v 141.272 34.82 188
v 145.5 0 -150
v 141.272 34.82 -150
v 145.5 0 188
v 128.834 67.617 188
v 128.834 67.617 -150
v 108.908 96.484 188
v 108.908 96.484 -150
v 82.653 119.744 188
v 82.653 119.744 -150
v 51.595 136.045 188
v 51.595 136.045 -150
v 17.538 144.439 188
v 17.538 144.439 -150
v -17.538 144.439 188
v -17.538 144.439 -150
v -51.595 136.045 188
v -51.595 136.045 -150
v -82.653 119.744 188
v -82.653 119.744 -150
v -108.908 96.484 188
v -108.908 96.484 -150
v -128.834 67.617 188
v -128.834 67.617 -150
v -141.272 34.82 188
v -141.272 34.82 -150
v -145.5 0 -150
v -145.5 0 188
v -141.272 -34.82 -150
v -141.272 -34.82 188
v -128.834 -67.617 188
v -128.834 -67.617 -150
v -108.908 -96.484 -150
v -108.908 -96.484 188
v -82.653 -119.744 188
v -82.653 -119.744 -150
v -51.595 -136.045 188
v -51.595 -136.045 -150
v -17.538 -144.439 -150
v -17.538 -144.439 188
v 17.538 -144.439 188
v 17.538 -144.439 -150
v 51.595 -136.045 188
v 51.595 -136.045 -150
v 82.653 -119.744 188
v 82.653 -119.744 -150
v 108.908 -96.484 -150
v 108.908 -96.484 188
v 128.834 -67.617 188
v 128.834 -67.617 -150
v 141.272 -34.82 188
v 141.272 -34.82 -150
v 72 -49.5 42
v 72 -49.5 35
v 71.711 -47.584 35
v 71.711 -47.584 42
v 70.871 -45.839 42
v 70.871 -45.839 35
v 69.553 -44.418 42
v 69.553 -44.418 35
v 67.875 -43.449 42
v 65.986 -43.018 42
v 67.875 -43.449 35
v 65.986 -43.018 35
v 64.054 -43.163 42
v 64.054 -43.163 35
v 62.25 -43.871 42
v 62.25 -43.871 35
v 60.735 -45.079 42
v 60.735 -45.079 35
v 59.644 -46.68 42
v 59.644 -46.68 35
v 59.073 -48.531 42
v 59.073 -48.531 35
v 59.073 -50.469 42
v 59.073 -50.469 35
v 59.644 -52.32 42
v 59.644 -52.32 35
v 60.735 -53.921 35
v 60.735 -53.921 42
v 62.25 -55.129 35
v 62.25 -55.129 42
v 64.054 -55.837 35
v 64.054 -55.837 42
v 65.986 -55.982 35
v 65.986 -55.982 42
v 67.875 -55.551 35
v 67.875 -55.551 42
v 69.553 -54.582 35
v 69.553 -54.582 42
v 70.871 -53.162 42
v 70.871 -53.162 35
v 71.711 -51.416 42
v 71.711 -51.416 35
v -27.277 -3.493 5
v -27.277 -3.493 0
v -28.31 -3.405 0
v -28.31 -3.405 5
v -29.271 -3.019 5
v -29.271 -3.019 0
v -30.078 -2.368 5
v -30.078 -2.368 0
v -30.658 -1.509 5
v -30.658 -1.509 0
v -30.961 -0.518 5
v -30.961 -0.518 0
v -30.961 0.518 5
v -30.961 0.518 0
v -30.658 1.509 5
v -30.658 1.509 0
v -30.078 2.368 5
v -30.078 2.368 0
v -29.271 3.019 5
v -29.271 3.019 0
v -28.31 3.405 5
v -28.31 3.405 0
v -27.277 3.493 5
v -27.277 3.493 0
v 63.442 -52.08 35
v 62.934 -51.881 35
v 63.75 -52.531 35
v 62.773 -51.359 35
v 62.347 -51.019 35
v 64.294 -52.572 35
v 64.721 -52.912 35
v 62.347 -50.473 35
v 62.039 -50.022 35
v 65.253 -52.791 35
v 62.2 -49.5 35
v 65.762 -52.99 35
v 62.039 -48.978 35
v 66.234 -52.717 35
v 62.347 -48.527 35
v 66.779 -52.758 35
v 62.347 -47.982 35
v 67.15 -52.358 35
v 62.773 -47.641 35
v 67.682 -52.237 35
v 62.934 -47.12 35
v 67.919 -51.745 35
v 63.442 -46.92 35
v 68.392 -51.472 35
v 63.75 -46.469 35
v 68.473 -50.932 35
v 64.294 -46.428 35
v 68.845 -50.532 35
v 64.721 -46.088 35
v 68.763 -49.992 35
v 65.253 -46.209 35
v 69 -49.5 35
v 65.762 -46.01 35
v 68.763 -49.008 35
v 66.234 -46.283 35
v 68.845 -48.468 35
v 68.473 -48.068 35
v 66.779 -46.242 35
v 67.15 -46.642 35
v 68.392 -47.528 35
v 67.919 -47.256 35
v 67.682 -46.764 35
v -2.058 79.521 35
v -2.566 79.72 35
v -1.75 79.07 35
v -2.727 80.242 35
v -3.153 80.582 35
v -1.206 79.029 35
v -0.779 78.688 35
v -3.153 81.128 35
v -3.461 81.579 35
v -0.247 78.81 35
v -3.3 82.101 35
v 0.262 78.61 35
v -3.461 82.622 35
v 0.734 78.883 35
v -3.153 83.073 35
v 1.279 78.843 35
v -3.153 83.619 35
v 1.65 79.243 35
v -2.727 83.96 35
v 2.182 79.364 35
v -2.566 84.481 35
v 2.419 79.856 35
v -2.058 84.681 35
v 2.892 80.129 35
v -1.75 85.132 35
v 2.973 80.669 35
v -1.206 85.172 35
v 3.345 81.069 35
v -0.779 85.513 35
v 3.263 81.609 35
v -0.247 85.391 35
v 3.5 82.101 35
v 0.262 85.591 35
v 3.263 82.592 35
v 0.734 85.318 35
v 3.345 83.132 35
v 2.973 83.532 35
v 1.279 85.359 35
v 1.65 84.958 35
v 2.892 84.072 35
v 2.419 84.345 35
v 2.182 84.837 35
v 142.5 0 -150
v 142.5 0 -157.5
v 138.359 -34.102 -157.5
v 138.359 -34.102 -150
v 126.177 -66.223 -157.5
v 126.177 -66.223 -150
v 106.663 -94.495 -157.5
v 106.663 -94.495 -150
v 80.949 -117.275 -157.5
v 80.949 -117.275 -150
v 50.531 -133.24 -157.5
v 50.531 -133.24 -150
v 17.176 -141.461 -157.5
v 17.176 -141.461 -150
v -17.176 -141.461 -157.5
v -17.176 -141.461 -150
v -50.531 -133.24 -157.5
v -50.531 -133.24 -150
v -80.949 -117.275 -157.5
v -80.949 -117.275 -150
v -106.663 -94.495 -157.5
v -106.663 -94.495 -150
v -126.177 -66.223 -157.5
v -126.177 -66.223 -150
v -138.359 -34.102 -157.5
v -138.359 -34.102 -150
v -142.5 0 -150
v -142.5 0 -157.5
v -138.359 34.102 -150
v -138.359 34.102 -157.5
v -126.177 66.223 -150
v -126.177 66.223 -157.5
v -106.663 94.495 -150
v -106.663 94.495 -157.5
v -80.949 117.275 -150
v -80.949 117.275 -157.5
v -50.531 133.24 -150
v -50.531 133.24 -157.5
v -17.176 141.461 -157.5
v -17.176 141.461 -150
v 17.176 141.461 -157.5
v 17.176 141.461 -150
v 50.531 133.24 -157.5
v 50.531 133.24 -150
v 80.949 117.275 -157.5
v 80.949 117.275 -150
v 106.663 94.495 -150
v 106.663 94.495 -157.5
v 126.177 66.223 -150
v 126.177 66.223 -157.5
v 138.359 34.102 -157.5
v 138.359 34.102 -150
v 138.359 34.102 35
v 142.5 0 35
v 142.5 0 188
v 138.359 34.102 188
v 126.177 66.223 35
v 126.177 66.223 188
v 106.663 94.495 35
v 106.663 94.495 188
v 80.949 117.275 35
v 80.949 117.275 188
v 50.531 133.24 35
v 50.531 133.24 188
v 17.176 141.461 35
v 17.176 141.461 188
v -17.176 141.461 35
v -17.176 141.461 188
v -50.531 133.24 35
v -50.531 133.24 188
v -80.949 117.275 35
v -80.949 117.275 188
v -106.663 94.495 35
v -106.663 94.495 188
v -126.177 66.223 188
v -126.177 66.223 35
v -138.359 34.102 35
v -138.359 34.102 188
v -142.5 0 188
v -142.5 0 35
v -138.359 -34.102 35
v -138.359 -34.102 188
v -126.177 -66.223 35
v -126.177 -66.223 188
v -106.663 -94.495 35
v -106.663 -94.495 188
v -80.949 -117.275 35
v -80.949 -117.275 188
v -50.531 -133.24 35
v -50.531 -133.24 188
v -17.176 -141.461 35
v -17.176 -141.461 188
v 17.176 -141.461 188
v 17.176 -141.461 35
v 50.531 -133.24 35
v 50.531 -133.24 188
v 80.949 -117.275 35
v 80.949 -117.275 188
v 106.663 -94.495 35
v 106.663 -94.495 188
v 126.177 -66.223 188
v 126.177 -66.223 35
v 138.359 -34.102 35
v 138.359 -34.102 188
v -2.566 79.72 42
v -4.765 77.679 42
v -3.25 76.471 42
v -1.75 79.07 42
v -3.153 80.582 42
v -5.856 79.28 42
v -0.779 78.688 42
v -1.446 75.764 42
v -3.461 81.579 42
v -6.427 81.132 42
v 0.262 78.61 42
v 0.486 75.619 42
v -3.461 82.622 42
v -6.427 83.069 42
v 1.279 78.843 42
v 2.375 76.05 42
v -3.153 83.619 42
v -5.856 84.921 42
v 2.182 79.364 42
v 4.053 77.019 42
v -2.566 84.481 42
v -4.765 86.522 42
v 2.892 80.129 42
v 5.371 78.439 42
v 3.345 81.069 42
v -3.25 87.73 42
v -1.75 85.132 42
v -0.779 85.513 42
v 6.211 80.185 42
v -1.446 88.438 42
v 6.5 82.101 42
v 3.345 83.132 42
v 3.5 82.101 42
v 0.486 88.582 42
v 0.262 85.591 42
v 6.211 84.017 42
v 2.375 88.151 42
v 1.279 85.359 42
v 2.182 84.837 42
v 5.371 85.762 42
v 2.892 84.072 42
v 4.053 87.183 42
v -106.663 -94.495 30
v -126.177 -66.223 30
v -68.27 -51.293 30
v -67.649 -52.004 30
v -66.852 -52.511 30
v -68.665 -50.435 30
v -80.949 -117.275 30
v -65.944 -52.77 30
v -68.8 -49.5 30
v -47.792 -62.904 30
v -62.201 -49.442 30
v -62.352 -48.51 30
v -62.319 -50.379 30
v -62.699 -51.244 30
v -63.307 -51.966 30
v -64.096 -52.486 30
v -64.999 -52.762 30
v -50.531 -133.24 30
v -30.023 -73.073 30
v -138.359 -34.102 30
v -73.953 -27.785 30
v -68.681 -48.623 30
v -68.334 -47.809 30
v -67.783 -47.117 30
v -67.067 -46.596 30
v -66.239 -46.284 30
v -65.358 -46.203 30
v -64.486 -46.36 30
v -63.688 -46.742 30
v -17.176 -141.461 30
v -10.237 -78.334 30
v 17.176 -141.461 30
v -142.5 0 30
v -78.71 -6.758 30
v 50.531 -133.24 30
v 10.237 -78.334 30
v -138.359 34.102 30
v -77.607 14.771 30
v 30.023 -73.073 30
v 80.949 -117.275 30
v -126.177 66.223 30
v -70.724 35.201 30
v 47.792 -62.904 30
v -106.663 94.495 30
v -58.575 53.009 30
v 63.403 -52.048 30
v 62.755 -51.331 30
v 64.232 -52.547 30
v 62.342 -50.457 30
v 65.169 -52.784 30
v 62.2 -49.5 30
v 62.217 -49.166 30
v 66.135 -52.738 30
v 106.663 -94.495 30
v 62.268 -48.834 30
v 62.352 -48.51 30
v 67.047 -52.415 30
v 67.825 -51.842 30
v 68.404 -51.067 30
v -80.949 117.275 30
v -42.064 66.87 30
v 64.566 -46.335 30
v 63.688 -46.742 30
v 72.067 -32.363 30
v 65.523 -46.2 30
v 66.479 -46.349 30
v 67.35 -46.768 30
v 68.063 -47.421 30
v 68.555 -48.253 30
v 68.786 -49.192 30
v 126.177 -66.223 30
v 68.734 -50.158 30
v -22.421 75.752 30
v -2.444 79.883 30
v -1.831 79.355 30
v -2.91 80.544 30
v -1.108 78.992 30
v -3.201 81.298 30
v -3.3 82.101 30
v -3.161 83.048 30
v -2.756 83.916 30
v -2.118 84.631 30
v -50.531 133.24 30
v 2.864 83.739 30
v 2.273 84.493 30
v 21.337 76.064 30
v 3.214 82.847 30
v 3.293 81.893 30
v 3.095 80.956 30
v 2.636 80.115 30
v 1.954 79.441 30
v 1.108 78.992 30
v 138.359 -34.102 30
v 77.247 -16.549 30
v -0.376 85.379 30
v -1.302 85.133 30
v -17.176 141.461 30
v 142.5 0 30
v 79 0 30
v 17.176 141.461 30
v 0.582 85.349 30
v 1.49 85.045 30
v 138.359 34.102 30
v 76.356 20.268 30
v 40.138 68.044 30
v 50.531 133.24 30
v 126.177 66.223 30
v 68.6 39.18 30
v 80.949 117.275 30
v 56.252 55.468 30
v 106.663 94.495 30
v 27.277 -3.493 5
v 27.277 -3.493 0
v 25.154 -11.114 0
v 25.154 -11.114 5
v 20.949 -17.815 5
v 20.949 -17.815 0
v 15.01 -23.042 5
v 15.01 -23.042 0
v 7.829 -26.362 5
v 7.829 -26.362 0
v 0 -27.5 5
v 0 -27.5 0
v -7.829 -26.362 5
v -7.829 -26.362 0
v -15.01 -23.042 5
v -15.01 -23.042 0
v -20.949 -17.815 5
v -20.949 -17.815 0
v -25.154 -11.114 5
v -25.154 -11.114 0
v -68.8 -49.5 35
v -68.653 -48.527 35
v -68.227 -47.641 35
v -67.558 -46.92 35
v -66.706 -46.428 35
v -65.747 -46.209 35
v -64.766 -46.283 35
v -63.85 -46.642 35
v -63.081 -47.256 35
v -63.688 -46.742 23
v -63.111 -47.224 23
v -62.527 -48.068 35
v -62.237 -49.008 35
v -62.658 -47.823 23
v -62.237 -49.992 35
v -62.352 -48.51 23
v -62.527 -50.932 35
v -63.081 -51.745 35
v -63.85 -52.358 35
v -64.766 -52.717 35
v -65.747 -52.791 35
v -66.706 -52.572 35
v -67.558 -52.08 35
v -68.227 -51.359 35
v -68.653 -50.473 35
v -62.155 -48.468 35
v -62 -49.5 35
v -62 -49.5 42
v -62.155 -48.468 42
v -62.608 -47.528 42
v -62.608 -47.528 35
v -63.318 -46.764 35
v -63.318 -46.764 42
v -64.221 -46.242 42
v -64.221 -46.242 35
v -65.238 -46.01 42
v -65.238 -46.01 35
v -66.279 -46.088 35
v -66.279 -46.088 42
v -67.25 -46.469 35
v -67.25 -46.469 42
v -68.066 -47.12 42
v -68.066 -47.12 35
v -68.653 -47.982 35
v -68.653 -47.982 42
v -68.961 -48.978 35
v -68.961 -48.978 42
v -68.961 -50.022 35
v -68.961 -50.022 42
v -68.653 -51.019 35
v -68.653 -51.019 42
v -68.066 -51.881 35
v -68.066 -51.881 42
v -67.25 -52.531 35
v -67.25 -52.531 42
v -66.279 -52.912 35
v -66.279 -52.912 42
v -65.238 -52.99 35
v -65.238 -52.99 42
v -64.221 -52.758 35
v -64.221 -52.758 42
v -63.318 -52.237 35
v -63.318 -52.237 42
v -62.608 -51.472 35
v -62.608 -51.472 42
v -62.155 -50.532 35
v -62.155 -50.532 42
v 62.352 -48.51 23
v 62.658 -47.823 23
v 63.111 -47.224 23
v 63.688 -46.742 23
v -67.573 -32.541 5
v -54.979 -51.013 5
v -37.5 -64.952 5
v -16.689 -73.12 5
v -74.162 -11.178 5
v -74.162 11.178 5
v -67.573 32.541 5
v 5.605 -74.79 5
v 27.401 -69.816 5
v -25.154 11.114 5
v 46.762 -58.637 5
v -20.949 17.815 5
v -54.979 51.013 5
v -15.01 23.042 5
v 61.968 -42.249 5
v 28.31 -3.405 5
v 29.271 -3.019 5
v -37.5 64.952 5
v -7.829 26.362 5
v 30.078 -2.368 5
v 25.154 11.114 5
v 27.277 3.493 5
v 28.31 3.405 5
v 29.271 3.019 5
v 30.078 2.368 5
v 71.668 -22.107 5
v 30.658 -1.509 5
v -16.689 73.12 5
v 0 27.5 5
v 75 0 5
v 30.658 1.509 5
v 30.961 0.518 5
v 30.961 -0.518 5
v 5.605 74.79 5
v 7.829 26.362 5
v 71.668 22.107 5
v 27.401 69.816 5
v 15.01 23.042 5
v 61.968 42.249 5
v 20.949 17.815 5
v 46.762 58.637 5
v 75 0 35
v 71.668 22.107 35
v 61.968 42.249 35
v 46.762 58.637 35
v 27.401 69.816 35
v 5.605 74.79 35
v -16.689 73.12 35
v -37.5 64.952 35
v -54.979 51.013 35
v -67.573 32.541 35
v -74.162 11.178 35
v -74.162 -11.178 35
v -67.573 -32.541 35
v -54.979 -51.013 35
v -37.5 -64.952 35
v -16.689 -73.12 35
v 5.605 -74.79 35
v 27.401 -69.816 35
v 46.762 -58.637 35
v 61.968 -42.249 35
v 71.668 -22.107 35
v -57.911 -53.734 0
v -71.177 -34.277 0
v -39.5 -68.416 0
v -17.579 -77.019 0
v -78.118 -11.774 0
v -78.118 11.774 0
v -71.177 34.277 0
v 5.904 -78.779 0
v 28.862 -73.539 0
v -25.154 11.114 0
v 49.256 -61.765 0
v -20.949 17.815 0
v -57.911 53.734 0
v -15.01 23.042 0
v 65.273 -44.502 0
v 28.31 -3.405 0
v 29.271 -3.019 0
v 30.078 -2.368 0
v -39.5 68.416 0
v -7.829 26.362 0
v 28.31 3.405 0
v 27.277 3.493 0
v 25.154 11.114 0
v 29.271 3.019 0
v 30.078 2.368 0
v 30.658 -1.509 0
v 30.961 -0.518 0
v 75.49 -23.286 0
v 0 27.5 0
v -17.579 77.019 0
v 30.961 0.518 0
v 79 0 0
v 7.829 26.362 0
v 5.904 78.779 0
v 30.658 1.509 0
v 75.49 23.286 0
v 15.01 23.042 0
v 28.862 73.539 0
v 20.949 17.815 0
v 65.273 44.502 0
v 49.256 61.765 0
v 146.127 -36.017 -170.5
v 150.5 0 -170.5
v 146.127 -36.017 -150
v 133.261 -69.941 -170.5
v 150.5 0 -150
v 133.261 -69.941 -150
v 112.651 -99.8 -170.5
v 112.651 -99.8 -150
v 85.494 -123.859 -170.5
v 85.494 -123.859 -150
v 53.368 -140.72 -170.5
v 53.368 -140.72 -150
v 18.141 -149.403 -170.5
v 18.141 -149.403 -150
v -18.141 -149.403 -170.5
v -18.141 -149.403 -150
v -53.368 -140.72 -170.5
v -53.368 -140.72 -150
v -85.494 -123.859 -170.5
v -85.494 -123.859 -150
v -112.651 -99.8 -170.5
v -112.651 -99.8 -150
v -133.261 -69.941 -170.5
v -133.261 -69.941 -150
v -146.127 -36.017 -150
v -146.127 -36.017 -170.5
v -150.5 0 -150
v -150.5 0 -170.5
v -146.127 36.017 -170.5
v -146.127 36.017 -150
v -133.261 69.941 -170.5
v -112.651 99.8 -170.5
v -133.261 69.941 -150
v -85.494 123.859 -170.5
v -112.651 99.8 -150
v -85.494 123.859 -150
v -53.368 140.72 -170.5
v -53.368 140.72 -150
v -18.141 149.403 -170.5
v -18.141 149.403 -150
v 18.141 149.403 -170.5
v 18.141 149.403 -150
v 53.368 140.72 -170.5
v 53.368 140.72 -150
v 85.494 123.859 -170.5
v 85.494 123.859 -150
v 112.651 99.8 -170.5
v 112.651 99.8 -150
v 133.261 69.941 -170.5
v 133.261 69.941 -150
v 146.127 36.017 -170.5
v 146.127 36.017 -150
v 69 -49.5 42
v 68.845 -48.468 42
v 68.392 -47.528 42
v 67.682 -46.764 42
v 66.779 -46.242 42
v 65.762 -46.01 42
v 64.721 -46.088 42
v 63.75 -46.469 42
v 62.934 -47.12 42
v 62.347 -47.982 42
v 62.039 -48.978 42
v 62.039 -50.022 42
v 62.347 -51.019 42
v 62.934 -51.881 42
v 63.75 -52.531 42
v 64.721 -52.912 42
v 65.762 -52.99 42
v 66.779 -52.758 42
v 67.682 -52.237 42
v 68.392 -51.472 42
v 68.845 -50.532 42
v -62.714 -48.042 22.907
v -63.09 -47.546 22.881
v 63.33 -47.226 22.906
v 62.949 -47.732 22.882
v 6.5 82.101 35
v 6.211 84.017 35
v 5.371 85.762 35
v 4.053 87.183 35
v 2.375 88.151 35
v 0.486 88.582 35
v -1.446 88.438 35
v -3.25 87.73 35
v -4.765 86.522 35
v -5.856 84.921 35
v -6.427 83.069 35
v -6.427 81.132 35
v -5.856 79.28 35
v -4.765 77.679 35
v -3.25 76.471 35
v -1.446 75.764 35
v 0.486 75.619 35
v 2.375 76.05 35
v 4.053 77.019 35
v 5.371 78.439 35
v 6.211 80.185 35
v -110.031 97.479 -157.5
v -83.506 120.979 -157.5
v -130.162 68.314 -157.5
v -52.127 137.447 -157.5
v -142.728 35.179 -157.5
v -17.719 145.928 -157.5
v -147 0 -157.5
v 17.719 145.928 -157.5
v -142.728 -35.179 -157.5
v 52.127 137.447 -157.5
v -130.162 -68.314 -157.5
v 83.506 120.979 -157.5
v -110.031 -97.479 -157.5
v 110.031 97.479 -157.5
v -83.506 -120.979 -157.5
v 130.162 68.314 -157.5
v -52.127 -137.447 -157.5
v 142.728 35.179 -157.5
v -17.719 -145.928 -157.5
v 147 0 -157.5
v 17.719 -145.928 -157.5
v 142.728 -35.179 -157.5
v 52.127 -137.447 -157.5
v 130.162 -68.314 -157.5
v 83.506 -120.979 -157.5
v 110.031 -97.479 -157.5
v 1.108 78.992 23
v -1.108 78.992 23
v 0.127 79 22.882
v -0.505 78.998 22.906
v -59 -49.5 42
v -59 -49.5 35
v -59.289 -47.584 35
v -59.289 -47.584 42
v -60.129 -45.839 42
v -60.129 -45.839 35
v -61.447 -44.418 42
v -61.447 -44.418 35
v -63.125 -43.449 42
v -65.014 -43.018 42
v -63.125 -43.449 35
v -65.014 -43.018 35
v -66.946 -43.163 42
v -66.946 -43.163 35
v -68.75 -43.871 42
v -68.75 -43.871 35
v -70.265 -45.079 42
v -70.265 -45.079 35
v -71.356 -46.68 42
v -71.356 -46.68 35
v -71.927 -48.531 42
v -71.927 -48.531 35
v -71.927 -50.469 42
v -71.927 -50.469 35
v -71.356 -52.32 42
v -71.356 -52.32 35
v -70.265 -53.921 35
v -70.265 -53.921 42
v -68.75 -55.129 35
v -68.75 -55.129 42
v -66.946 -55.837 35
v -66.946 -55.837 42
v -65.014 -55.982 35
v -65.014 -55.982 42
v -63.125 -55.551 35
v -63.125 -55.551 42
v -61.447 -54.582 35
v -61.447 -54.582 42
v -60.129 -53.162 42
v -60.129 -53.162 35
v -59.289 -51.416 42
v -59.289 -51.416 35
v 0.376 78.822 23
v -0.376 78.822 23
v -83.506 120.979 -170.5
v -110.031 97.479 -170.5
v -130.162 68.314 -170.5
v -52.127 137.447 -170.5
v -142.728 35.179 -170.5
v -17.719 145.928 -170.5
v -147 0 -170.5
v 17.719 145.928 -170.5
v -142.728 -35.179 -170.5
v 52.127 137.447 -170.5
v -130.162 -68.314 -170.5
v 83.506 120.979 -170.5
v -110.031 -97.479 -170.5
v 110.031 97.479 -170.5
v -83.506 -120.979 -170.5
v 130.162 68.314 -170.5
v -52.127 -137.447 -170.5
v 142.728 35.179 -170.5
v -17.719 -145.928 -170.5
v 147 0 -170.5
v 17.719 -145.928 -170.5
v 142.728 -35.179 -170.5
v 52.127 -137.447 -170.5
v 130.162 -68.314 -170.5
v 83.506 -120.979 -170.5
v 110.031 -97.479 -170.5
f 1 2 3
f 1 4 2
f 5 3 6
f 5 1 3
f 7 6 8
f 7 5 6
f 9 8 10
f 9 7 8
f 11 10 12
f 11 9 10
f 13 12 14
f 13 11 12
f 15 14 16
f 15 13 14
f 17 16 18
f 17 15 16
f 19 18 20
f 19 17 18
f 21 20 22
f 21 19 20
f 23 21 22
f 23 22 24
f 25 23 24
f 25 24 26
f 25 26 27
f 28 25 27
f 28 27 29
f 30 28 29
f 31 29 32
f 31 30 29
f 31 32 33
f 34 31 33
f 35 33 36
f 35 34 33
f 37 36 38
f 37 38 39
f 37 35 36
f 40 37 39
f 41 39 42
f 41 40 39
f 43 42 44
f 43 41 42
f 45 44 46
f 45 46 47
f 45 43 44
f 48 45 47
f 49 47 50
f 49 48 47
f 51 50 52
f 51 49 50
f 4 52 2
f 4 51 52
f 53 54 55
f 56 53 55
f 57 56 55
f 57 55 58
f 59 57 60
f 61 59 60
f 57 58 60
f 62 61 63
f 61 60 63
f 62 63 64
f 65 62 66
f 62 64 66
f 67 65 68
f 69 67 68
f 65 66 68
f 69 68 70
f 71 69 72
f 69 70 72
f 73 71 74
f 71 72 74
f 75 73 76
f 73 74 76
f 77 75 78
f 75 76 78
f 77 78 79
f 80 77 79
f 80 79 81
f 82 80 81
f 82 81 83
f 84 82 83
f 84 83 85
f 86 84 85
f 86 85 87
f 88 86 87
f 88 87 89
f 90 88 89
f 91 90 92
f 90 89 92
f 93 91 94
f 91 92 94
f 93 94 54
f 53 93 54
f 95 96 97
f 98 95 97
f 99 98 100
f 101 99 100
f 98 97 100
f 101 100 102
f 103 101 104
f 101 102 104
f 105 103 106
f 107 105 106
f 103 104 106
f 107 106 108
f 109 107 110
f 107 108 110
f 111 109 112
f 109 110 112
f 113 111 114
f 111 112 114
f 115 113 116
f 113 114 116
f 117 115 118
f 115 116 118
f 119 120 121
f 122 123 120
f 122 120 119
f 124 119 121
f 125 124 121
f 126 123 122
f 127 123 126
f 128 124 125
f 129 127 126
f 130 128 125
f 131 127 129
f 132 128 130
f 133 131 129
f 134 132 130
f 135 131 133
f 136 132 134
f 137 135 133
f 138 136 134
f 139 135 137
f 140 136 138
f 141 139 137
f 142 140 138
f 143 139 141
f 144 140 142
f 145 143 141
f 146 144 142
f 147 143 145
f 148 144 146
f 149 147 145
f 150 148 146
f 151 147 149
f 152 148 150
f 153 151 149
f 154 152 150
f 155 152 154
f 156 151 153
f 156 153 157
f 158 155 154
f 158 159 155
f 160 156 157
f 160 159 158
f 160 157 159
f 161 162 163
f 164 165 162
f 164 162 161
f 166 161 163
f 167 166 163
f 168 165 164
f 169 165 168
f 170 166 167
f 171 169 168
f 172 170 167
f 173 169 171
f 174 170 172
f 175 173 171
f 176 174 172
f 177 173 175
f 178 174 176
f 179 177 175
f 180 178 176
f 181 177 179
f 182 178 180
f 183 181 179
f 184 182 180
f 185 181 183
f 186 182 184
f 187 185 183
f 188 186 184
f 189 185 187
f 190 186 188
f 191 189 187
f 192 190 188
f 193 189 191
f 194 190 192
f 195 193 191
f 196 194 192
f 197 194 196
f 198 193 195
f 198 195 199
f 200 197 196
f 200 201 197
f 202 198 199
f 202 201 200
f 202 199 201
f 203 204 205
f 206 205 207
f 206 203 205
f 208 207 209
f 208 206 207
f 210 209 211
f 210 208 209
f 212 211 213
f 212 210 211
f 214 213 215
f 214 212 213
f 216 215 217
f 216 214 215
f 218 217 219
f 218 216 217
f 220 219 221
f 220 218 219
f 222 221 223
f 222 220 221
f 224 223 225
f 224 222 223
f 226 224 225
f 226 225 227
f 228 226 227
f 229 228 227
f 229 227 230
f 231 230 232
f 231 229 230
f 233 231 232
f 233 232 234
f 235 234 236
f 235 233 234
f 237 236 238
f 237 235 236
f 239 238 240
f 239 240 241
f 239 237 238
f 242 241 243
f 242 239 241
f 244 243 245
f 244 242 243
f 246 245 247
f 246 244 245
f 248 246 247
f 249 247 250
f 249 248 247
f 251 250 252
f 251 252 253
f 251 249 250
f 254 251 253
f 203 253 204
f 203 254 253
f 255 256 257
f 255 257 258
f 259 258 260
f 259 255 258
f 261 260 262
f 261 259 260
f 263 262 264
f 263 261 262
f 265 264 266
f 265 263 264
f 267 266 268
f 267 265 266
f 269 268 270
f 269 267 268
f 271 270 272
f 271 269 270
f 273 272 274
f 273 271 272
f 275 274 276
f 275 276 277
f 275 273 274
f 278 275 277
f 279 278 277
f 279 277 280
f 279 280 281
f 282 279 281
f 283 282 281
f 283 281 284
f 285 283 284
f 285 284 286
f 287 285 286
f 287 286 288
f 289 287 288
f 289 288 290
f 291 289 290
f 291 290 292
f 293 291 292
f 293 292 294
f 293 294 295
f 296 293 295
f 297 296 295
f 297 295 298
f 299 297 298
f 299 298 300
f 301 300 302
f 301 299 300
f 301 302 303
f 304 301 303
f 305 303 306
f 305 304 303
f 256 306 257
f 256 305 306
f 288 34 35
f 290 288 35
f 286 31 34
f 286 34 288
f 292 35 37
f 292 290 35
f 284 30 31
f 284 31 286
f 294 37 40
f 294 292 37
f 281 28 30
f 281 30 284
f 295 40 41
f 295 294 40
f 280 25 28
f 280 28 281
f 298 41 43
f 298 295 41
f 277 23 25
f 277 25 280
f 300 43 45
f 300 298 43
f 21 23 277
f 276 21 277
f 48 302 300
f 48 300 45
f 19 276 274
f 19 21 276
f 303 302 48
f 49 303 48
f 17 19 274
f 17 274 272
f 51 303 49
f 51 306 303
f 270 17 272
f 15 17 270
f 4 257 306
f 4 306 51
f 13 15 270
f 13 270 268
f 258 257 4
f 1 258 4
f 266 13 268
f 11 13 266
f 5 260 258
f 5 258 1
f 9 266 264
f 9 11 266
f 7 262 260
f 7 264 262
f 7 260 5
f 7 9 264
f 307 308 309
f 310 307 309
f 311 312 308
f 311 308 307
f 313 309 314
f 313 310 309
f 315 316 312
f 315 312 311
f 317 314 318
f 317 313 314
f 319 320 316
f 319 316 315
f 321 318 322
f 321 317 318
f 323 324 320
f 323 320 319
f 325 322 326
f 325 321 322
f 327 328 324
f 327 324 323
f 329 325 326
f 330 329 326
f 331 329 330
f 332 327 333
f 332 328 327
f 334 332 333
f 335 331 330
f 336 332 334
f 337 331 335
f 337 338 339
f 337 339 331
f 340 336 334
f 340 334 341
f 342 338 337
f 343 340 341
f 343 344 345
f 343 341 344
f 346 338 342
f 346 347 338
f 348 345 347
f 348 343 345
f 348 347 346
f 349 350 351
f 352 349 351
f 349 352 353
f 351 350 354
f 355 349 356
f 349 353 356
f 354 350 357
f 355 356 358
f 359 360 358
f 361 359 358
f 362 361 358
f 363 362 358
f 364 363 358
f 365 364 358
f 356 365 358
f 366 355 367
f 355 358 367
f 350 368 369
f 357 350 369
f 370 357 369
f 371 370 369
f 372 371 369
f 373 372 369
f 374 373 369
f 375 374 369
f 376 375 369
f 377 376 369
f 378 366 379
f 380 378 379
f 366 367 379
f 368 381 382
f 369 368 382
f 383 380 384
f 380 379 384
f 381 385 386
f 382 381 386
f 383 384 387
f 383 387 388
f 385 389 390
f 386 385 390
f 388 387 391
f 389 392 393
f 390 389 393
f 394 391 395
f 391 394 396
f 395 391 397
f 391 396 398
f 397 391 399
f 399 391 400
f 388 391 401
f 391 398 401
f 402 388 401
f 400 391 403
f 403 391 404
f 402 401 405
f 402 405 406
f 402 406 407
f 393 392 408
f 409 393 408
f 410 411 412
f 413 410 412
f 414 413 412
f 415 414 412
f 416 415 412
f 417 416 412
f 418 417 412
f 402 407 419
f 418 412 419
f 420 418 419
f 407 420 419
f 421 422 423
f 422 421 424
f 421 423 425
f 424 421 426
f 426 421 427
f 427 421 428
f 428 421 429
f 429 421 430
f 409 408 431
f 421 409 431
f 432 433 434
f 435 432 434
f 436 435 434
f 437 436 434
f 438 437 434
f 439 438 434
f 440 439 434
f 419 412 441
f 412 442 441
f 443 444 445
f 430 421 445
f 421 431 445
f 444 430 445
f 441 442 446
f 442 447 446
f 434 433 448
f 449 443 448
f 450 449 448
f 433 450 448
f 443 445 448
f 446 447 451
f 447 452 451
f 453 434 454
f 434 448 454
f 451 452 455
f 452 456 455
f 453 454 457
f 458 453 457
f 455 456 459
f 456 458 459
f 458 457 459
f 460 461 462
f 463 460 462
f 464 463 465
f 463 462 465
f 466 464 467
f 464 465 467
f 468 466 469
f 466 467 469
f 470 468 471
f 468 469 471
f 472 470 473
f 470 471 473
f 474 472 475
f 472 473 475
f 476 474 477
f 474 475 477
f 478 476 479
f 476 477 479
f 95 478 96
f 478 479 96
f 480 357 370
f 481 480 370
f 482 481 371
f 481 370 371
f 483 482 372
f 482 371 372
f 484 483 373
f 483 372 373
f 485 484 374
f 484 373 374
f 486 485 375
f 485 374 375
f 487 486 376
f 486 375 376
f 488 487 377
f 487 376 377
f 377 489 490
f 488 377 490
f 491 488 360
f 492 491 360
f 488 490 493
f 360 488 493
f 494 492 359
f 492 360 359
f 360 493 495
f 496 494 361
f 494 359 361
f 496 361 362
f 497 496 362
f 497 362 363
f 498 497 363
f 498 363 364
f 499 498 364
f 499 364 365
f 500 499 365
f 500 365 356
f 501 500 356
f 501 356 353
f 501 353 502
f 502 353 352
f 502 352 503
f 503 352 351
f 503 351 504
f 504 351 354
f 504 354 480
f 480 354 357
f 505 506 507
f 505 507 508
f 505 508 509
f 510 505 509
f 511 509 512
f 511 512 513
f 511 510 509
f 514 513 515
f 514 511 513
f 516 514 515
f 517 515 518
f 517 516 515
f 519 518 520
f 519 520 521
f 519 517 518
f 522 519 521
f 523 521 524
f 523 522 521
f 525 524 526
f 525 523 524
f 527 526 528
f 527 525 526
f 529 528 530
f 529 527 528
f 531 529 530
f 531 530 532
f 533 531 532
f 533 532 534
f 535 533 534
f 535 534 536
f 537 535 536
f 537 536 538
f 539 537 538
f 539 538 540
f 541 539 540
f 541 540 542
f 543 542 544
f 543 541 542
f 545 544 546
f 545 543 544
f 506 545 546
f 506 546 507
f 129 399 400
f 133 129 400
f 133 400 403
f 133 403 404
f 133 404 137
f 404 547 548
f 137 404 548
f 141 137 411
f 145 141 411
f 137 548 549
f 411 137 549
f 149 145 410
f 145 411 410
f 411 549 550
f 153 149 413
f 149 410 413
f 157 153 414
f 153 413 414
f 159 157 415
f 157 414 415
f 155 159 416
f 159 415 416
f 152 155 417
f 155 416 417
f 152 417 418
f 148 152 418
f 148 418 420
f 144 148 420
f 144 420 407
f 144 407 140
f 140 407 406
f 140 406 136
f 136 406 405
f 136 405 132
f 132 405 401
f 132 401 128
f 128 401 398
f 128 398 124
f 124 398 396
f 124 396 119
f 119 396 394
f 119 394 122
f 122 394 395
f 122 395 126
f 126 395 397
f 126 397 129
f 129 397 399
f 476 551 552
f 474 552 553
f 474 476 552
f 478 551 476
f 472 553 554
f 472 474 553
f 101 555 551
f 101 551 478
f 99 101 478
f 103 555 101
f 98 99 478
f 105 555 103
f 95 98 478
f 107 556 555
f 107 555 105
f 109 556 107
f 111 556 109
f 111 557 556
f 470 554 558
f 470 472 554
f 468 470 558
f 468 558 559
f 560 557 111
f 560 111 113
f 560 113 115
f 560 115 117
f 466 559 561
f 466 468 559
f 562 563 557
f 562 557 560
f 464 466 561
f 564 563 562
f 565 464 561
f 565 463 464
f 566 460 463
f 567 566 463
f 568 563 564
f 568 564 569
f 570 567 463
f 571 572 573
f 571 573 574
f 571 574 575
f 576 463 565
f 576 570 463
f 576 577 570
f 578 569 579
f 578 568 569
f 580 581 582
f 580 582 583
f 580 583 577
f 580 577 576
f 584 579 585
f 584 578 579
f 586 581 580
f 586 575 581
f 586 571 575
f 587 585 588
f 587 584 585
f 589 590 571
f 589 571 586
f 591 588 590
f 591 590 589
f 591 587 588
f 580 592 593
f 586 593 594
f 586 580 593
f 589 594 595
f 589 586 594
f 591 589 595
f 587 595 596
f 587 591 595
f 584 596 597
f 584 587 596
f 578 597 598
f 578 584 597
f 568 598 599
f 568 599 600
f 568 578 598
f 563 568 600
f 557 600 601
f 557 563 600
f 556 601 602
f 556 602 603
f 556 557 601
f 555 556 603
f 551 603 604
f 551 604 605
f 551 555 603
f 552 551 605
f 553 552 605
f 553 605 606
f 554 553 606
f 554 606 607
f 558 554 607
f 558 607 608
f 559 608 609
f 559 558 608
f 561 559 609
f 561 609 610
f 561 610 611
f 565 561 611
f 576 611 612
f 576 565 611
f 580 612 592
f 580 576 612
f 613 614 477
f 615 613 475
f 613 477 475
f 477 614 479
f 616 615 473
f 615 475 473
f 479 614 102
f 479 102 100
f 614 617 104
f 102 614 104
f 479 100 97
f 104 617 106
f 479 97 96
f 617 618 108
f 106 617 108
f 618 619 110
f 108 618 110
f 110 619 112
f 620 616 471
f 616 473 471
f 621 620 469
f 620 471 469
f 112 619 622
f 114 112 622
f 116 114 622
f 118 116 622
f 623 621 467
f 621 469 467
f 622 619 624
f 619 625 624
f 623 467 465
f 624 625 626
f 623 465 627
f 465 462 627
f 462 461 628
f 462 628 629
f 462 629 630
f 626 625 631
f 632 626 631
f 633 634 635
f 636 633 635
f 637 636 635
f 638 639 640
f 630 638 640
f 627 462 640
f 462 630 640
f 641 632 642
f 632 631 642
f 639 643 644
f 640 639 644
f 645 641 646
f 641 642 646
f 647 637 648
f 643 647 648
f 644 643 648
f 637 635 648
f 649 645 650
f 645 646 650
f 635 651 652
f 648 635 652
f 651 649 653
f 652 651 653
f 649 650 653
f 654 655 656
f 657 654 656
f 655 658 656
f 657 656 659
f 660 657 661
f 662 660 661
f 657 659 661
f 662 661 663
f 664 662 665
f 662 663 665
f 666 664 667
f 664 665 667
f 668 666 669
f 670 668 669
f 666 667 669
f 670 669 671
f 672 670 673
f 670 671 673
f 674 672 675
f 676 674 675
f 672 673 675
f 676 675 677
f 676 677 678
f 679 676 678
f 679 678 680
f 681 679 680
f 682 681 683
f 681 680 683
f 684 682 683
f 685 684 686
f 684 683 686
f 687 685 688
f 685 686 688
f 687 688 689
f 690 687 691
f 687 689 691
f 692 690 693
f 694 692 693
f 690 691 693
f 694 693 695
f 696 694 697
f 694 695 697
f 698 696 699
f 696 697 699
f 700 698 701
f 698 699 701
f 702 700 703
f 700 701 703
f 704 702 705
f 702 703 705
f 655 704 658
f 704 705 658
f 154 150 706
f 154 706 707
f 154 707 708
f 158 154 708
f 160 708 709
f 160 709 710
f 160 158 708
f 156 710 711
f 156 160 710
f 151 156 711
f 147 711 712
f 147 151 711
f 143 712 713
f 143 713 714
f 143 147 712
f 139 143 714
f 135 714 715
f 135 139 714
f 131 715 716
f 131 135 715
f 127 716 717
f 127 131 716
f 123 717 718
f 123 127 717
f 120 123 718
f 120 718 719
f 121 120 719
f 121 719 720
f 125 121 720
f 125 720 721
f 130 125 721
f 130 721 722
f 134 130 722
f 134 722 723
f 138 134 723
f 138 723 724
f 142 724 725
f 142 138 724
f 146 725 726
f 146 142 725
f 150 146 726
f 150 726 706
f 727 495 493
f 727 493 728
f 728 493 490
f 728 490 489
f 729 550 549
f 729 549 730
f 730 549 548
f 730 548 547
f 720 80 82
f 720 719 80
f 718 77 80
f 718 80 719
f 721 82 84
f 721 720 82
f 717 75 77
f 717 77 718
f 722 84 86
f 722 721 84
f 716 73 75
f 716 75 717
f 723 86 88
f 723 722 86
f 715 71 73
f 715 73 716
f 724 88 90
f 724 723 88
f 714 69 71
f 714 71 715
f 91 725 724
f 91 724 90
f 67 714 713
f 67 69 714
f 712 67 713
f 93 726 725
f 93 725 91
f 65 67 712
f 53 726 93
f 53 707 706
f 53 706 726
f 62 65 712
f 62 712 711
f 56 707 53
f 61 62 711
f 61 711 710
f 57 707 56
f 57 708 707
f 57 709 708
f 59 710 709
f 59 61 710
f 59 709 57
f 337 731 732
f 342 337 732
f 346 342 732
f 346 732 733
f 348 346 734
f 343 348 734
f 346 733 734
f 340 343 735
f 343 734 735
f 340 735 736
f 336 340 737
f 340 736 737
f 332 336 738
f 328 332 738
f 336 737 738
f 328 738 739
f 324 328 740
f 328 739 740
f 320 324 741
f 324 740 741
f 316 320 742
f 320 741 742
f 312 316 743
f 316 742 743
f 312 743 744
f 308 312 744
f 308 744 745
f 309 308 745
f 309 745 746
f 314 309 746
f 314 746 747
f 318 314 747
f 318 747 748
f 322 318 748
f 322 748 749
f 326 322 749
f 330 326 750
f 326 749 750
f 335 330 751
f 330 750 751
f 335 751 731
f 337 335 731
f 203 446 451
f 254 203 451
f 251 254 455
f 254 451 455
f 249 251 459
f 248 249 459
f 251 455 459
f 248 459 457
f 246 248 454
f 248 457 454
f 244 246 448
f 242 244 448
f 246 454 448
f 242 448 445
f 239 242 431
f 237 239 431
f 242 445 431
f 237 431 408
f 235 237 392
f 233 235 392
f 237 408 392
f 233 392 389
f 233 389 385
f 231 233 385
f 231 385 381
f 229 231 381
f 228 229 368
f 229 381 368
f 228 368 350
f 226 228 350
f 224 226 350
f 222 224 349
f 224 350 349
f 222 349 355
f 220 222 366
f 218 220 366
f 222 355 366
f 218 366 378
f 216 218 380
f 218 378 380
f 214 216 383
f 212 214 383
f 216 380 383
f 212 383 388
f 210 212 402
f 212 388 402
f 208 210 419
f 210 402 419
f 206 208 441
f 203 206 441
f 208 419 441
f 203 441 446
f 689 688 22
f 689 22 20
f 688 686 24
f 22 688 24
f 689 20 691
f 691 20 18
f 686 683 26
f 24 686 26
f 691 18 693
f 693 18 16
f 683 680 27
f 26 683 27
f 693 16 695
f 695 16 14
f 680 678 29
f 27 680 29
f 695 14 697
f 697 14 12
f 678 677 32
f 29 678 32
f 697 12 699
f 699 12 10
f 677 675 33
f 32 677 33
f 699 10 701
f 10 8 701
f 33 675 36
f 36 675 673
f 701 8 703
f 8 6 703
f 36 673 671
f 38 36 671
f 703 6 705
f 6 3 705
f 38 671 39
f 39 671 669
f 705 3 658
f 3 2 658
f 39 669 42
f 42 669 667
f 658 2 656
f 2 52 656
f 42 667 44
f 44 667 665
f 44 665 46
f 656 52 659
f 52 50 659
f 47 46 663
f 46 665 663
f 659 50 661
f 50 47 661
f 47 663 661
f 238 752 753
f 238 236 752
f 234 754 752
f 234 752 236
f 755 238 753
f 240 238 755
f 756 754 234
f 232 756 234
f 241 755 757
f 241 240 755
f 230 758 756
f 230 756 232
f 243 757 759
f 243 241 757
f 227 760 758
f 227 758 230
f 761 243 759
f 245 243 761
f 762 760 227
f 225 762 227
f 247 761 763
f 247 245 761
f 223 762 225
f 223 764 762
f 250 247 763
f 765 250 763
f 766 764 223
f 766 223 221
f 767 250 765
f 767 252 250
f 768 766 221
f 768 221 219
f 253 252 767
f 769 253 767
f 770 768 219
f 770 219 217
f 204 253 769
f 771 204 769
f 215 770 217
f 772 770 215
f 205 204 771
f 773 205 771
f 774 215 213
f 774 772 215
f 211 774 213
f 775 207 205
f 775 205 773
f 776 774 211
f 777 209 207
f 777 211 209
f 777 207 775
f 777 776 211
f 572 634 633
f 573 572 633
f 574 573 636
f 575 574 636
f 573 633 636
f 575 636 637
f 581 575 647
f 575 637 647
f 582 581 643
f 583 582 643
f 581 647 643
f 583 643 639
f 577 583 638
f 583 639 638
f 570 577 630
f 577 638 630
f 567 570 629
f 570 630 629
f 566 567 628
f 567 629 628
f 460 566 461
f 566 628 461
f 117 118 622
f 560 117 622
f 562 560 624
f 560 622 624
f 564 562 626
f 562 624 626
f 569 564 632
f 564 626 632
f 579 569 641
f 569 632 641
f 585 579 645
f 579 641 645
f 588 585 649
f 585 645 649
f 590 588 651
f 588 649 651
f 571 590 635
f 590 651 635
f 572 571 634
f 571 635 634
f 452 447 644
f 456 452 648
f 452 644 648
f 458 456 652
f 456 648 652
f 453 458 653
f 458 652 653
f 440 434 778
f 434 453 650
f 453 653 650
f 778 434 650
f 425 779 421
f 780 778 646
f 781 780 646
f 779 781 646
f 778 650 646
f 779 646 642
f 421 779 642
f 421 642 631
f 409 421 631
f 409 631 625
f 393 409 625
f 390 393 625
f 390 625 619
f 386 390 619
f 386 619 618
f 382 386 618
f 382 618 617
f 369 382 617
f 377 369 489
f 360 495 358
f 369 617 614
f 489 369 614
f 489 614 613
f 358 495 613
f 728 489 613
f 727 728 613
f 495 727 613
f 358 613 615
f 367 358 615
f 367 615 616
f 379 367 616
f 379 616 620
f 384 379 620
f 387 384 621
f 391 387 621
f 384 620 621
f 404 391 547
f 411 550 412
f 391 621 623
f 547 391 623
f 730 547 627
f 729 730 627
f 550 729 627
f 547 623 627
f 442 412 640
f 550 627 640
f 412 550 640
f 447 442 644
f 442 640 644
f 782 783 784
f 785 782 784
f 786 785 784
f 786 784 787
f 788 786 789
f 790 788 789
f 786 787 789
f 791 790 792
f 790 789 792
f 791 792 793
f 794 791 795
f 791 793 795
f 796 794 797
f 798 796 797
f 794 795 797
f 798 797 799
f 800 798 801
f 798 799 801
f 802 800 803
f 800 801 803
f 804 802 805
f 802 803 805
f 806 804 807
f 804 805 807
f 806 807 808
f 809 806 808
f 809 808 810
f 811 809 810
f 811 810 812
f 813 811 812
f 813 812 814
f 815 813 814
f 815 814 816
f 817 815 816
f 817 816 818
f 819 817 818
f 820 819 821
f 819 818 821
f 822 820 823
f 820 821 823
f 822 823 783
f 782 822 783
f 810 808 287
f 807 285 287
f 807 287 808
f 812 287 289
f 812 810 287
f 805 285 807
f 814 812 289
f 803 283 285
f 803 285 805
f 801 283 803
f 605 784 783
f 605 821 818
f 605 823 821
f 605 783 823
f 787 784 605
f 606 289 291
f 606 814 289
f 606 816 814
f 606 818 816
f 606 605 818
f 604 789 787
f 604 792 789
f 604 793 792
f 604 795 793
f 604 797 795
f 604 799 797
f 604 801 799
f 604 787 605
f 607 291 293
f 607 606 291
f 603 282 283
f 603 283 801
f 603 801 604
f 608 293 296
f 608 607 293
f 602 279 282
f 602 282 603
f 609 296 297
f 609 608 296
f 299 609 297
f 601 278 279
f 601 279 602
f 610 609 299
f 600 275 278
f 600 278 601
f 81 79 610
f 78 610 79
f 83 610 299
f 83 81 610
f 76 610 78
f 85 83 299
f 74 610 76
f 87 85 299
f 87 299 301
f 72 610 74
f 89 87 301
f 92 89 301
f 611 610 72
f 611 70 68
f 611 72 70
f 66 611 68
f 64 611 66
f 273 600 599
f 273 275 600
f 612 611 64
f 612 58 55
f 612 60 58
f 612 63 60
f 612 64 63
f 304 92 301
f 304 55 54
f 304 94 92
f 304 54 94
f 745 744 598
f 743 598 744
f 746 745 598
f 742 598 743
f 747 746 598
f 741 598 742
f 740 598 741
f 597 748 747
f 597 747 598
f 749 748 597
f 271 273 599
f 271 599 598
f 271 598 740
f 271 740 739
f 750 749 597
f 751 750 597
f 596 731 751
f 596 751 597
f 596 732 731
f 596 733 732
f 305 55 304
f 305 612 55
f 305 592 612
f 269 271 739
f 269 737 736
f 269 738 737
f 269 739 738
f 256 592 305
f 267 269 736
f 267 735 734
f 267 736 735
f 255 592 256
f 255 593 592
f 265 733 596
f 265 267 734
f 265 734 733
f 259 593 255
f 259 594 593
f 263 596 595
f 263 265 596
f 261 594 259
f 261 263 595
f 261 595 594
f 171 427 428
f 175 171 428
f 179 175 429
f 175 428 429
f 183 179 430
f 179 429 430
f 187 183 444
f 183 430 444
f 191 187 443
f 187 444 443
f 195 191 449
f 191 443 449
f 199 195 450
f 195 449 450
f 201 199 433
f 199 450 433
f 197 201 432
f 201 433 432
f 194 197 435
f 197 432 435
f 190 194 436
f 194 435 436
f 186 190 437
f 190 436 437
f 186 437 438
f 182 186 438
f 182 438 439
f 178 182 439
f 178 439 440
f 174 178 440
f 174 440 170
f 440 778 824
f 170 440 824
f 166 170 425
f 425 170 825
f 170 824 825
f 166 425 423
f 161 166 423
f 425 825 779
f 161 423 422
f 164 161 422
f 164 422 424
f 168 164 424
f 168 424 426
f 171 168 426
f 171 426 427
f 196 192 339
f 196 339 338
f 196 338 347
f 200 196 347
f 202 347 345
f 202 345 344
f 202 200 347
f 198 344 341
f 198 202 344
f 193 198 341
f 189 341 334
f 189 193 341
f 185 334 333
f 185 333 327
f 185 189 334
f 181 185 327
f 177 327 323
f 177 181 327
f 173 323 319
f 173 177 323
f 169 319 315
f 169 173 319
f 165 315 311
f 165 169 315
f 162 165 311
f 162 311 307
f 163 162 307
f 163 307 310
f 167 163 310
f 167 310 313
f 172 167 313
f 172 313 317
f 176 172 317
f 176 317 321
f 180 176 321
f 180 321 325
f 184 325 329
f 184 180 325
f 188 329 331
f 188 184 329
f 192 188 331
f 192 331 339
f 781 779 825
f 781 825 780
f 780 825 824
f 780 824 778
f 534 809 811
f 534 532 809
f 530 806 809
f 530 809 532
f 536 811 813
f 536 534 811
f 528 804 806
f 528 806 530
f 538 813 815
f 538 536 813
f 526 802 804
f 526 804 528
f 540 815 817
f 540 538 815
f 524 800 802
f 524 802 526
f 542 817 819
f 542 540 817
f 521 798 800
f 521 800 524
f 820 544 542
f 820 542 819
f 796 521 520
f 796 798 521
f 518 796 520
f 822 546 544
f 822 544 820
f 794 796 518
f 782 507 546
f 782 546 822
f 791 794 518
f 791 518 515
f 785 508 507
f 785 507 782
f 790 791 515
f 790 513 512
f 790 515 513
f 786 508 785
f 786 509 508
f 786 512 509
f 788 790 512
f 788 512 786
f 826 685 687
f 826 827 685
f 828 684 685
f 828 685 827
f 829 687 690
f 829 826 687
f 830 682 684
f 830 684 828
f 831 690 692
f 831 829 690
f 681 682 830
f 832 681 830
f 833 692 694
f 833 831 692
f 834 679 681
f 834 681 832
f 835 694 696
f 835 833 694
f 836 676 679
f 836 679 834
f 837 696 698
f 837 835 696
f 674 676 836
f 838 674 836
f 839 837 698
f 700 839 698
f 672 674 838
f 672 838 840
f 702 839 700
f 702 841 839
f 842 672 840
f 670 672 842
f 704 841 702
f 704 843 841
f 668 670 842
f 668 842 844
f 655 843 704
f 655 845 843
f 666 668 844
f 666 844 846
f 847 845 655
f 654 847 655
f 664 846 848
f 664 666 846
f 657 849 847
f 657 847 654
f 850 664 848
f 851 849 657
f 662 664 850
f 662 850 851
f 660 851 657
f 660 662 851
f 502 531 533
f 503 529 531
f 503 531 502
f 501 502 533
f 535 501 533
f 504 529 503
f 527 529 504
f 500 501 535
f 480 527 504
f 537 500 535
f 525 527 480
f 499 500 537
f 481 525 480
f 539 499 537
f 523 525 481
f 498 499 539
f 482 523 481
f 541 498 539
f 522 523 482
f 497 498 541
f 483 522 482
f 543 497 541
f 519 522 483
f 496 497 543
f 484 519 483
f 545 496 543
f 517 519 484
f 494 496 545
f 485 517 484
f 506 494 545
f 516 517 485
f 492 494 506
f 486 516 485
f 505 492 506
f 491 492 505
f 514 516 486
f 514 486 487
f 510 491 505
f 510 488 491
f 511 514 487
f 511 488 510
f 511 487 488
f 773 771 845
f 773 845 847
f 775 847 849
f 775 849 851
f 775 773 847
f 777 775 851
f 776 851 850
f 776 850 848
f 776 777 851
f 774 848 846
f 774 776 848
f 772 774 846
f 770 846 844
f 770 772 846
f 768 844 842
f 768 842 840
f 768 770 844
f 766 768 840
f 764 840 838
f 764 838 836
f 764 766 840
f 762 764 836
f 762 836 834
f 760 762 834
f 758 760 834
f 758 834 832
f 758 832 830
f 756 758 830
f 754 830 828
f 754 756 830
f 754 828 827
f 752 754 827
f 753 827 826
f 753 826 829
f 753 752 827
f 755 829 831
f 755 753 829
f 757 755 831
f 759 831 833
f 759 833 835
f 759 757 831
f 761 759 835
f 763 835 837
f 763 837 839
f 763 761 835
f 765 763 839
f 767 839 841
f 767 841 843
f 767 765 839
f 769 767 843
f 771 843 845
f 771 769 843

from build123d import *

# Parameters (mm, degrees)
F0_R      = 75
F1_DEPTH  = 5
F0_R_2    = 79
F2_DEPTH  = 30
F3_R      = 142.5
F3_R_2    = 79
F3_R_3    = 75
F4_DEPTH  = 5
F3_R_4    = 145.5
F5_DEPTH  = 158
F6_DEPTH  = 180
F7_R      = 150.5
F7_R_2    = 145.5
F7_R_3    = 142.5
F8_DEPTH  = 7.5
F9_R      = 150.5
F9_R_2    = 147
F10_DEPTH = 13
F11_R     = 6.5
F11_R_2   = 3.5
F12_DEPTH = 7
F13_D     = 6.6
F13_DEPTH = 12
F13_TIP   = 1.9828400428


with BuildPart() as f1:
    # F0 (on Top) → F1 (new body)
    with BuildSketch(Plane.XY):
        Circle(F0_R)
        with BuildLine():
            ThreePointArc((-27.2772727273, 3.4929060339), (0, 27.5), (27.2772727273, 3.4929060339))
            ThreePointArc((27.2772727273, 3.4929060339), (31, 0), (27.2772727273, -3.4929060339))
            ThreePointArc((27.2772727273, -3.4929060339), (0, -27.5), (-27.2772727273, -3.4929060339))
            ThreePointArc((-27.2772727273, -3.4929060339), (-31, 0), (-27.2772727273, 3.4929060339))
        make_face(mode=Mode.SUBTRACT)
    extrude(amount=F1_DEPTH)

    # F0 (on Top) → F2 (join)
    with BuildSketch(Plane.XY):
        Circle(F0_R_2)
        Circle(F0_R, mode=Mode.SUBTRACT)
    extrude(amount=F2_DEPTH)

    # F3 (on face) → F4 (join)
    with BuildSketch(Plane.XY.offset(30)):
        Circle(F3_R)
        Circle(F3_R_2, mode=Mode.SUBTRACT)
        Circle(F3_R_2)
        Circle(F3_R_3, mode=Mode.SUBTRACT)
    extrude(amount=F4_DEPTH)

    # F3 (on face) → F5 (join)
    with BuildSketch(Plane.XY.offset(30)):
        Circle(F3_R_4)
        Circle(F3_R, mode=Mode.SUBTRACT)
    extrude(amount=F5_DEPTH)

    # F3 (on face) → F6 (join)
    with BuildSketch(Plane.XY.offset(30)):
        Circle(F3_R_4)
        Circle(F3_R, mode=Mode.SUBTRACT)
    extrude(amount=-F6_DEPTH)

    # F7 (on face) → F8 (join)
    with BuildSketch(Plane(origin=(0, 0, -150), x_dir=(1, 0, 0), z_dir=(0, 0, -1))):
        Circle(F7_R)
        Circle(F7_R_2, mode=Mode.SUBTRACT)
        Circle(F7_R_2)
        Circle(F7_R_3, mode=Mode.SUBTRACT)
    extrude(amount=F8_DEPTH)

    # F9 (on face) → F10 (join)
    with BuildSketch(Plane(origin=(0, 0, -157.5), x_dir=(1, 0, 0), z_dir=(0, 0, -1))):
        Circle(F9_R)
        Circle(F9_R_2, mode=Mode.SUBTRACT)
    extrude(amount=F10_DEPTH)

    # F11 (on face) → F12 (join)
    with BuildSketch(Plane.XY.offset(35)):
        with Locations((0, 82.1006134727)):
            Circle(F11_R)
        with Locations((0, 82.1006134727)):
            Circle(F11_R_2, mode=Mode.SUBTRACT)
        with Locations((65.5, -49.5001084099)):
            Circle(F11_R)
        with Locations((65.5, -49.5001084099)):
            Circle(F11_R_2, mode=Mode.SUBTRACT)
        with Locations((-65.5, -49.5001084099)):
            Circle(F11_R)
        with Locations((-65.5, -49.5001084099)):
            Circle(F11_R_2, mode=Mode.SUBTRACT)
    extrude(amount=F12_DEPTH)

    # F13
    with Locations(Plane.XY.offset(35)):
        with Locations((0, 82.1006134727), (65.5, -49.5001084099), (-65.5, -49.5001084099)):
            Hole(F13_D / 2, depth=F13_DEPTH)
            with Locations((0, 0, -(F13_DEPTH + F13_TIP / 2))):  # 118° drill point
                Cone(0, F13_D / 2, F13_TIP, mode=Mode.SUBTRACT)


solid = f1.part
